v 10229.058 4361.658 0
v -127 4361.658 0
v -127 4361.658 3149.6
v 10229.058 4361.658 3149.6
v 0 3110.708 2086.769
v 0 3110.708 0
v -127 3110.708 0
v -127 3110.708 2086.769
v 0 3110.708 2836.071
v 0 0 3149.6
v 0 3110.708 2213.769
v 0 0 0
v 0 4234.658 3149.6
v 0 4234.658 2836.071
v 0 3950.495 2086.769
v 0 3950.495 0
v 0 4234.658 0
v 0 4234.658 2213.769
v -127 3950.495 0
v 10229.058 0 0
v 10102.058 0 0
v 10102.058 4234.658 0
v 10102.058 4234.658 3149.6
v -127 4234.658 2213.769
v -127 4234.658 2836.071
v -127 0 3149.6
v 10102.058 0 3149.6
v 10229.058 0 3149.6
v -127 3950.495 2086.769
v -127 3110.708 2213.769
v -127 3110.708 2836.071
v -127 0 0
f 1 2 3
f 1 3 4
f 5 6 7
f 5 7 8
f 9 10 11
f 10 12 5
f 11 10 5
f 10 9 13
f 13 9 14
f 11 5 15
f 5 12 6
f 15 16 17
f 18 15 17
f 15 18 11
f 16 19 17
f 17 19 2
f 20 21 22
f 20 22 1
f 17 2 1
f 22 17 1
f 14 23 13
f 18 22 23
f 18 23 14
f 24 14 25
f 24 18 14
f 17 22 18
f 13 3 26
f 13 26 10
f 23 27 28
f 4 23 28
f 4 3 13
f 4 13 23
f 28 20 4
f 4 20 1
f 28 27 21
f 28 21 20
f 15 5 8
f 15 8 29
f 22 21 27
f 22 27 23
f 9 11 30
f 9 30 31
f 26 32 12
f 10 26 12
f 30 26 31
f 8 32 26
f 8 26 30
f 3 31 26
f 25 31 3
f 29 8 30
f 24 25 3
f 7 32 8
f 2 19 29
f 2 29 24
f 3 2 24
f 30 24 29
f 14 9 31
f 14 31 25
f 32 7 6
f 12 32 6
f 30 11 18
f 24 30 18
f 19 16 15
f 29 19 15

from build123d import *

# Parameters (mm, degrees)
F1_W     = 10356.05752
F1_H     = 4488.65752
F1_W_2   = 10102.05752
F1_H_2   = 4234.65752
F2_DEPTH = 3149.6
F3_W     = 839.7875
F3_H     = 2086.76875
F4_DEPTH = 127.001
F5_W     = 1123.95
F5_H     = 457.20254
F6_DEPTH = 127.001
F7_DEPTH = 127
F8_DEPTH = 139.7
F9_DEPTH = 25.4


with BuildPart() as f2:
    # F1 (on face) → F2 (new body)
    with BuildSketch(Plane.XY):
        with Locations((5051.02876, 2117.32876)):
            Rectangle(F1_W, F1_H)
        with Locations((5051.02876, 2117.32876)):
            Rectangle(F1_W_2, F1_H_2, mode=Mode.SUBTRACT)
    extrude(amount=F2_DEPTH)

    # F3 (on face) → F4 (cut, through all)
    with BuildSketch(Plane.YZ):
        with Locations((3530.60127, 1043.384375)):
            Rectangle(F3_W, F3_H)
    extrude(amount=-F4_DEPTH, mode=Mode.SUBTRACT)

    # F5 (on face) → F6 (cut, through all)
    with BuildSketch(Plane.YZ):
        with Locations((3672.68252, 2442.37002)):
            Rectangle(F5_W, F5_H)
    extrude(amount=-F6_DEPTH, mode=Mode.SUBTRACT)

    # F7 (cut): a face of the model
    f7_faces = [f2.faces().sort_by_distance(p)[0] for p in [
        (5051.02876, -127, 1574.8),
    ]]
    extrude(f7_faces, amount=-F7_DEPTH, mode=Mode.SUBTRACT)

    # F8 (cut): a face of the model
    f8_faces = [f2.faces().sort_by_distance(p)[0] for p in [
        (-63.5, 3672.68252, 2670.97129),
    ]]
    extrude(f8_faces, amount=-F8_DEPTH, mode=Mode.SUBTRACT)

    # F9 (cut): a face of the model
    f9_faces = [f2.faces().sort_by_distance(p)[0] for p in [
        (-63.5, 3672.68252, 2810.67129),
    ]]
    extrude(f9_faces, amount=-F9_DEPTH, mode=Mode.SUBTRACT)


solid = f2.part
